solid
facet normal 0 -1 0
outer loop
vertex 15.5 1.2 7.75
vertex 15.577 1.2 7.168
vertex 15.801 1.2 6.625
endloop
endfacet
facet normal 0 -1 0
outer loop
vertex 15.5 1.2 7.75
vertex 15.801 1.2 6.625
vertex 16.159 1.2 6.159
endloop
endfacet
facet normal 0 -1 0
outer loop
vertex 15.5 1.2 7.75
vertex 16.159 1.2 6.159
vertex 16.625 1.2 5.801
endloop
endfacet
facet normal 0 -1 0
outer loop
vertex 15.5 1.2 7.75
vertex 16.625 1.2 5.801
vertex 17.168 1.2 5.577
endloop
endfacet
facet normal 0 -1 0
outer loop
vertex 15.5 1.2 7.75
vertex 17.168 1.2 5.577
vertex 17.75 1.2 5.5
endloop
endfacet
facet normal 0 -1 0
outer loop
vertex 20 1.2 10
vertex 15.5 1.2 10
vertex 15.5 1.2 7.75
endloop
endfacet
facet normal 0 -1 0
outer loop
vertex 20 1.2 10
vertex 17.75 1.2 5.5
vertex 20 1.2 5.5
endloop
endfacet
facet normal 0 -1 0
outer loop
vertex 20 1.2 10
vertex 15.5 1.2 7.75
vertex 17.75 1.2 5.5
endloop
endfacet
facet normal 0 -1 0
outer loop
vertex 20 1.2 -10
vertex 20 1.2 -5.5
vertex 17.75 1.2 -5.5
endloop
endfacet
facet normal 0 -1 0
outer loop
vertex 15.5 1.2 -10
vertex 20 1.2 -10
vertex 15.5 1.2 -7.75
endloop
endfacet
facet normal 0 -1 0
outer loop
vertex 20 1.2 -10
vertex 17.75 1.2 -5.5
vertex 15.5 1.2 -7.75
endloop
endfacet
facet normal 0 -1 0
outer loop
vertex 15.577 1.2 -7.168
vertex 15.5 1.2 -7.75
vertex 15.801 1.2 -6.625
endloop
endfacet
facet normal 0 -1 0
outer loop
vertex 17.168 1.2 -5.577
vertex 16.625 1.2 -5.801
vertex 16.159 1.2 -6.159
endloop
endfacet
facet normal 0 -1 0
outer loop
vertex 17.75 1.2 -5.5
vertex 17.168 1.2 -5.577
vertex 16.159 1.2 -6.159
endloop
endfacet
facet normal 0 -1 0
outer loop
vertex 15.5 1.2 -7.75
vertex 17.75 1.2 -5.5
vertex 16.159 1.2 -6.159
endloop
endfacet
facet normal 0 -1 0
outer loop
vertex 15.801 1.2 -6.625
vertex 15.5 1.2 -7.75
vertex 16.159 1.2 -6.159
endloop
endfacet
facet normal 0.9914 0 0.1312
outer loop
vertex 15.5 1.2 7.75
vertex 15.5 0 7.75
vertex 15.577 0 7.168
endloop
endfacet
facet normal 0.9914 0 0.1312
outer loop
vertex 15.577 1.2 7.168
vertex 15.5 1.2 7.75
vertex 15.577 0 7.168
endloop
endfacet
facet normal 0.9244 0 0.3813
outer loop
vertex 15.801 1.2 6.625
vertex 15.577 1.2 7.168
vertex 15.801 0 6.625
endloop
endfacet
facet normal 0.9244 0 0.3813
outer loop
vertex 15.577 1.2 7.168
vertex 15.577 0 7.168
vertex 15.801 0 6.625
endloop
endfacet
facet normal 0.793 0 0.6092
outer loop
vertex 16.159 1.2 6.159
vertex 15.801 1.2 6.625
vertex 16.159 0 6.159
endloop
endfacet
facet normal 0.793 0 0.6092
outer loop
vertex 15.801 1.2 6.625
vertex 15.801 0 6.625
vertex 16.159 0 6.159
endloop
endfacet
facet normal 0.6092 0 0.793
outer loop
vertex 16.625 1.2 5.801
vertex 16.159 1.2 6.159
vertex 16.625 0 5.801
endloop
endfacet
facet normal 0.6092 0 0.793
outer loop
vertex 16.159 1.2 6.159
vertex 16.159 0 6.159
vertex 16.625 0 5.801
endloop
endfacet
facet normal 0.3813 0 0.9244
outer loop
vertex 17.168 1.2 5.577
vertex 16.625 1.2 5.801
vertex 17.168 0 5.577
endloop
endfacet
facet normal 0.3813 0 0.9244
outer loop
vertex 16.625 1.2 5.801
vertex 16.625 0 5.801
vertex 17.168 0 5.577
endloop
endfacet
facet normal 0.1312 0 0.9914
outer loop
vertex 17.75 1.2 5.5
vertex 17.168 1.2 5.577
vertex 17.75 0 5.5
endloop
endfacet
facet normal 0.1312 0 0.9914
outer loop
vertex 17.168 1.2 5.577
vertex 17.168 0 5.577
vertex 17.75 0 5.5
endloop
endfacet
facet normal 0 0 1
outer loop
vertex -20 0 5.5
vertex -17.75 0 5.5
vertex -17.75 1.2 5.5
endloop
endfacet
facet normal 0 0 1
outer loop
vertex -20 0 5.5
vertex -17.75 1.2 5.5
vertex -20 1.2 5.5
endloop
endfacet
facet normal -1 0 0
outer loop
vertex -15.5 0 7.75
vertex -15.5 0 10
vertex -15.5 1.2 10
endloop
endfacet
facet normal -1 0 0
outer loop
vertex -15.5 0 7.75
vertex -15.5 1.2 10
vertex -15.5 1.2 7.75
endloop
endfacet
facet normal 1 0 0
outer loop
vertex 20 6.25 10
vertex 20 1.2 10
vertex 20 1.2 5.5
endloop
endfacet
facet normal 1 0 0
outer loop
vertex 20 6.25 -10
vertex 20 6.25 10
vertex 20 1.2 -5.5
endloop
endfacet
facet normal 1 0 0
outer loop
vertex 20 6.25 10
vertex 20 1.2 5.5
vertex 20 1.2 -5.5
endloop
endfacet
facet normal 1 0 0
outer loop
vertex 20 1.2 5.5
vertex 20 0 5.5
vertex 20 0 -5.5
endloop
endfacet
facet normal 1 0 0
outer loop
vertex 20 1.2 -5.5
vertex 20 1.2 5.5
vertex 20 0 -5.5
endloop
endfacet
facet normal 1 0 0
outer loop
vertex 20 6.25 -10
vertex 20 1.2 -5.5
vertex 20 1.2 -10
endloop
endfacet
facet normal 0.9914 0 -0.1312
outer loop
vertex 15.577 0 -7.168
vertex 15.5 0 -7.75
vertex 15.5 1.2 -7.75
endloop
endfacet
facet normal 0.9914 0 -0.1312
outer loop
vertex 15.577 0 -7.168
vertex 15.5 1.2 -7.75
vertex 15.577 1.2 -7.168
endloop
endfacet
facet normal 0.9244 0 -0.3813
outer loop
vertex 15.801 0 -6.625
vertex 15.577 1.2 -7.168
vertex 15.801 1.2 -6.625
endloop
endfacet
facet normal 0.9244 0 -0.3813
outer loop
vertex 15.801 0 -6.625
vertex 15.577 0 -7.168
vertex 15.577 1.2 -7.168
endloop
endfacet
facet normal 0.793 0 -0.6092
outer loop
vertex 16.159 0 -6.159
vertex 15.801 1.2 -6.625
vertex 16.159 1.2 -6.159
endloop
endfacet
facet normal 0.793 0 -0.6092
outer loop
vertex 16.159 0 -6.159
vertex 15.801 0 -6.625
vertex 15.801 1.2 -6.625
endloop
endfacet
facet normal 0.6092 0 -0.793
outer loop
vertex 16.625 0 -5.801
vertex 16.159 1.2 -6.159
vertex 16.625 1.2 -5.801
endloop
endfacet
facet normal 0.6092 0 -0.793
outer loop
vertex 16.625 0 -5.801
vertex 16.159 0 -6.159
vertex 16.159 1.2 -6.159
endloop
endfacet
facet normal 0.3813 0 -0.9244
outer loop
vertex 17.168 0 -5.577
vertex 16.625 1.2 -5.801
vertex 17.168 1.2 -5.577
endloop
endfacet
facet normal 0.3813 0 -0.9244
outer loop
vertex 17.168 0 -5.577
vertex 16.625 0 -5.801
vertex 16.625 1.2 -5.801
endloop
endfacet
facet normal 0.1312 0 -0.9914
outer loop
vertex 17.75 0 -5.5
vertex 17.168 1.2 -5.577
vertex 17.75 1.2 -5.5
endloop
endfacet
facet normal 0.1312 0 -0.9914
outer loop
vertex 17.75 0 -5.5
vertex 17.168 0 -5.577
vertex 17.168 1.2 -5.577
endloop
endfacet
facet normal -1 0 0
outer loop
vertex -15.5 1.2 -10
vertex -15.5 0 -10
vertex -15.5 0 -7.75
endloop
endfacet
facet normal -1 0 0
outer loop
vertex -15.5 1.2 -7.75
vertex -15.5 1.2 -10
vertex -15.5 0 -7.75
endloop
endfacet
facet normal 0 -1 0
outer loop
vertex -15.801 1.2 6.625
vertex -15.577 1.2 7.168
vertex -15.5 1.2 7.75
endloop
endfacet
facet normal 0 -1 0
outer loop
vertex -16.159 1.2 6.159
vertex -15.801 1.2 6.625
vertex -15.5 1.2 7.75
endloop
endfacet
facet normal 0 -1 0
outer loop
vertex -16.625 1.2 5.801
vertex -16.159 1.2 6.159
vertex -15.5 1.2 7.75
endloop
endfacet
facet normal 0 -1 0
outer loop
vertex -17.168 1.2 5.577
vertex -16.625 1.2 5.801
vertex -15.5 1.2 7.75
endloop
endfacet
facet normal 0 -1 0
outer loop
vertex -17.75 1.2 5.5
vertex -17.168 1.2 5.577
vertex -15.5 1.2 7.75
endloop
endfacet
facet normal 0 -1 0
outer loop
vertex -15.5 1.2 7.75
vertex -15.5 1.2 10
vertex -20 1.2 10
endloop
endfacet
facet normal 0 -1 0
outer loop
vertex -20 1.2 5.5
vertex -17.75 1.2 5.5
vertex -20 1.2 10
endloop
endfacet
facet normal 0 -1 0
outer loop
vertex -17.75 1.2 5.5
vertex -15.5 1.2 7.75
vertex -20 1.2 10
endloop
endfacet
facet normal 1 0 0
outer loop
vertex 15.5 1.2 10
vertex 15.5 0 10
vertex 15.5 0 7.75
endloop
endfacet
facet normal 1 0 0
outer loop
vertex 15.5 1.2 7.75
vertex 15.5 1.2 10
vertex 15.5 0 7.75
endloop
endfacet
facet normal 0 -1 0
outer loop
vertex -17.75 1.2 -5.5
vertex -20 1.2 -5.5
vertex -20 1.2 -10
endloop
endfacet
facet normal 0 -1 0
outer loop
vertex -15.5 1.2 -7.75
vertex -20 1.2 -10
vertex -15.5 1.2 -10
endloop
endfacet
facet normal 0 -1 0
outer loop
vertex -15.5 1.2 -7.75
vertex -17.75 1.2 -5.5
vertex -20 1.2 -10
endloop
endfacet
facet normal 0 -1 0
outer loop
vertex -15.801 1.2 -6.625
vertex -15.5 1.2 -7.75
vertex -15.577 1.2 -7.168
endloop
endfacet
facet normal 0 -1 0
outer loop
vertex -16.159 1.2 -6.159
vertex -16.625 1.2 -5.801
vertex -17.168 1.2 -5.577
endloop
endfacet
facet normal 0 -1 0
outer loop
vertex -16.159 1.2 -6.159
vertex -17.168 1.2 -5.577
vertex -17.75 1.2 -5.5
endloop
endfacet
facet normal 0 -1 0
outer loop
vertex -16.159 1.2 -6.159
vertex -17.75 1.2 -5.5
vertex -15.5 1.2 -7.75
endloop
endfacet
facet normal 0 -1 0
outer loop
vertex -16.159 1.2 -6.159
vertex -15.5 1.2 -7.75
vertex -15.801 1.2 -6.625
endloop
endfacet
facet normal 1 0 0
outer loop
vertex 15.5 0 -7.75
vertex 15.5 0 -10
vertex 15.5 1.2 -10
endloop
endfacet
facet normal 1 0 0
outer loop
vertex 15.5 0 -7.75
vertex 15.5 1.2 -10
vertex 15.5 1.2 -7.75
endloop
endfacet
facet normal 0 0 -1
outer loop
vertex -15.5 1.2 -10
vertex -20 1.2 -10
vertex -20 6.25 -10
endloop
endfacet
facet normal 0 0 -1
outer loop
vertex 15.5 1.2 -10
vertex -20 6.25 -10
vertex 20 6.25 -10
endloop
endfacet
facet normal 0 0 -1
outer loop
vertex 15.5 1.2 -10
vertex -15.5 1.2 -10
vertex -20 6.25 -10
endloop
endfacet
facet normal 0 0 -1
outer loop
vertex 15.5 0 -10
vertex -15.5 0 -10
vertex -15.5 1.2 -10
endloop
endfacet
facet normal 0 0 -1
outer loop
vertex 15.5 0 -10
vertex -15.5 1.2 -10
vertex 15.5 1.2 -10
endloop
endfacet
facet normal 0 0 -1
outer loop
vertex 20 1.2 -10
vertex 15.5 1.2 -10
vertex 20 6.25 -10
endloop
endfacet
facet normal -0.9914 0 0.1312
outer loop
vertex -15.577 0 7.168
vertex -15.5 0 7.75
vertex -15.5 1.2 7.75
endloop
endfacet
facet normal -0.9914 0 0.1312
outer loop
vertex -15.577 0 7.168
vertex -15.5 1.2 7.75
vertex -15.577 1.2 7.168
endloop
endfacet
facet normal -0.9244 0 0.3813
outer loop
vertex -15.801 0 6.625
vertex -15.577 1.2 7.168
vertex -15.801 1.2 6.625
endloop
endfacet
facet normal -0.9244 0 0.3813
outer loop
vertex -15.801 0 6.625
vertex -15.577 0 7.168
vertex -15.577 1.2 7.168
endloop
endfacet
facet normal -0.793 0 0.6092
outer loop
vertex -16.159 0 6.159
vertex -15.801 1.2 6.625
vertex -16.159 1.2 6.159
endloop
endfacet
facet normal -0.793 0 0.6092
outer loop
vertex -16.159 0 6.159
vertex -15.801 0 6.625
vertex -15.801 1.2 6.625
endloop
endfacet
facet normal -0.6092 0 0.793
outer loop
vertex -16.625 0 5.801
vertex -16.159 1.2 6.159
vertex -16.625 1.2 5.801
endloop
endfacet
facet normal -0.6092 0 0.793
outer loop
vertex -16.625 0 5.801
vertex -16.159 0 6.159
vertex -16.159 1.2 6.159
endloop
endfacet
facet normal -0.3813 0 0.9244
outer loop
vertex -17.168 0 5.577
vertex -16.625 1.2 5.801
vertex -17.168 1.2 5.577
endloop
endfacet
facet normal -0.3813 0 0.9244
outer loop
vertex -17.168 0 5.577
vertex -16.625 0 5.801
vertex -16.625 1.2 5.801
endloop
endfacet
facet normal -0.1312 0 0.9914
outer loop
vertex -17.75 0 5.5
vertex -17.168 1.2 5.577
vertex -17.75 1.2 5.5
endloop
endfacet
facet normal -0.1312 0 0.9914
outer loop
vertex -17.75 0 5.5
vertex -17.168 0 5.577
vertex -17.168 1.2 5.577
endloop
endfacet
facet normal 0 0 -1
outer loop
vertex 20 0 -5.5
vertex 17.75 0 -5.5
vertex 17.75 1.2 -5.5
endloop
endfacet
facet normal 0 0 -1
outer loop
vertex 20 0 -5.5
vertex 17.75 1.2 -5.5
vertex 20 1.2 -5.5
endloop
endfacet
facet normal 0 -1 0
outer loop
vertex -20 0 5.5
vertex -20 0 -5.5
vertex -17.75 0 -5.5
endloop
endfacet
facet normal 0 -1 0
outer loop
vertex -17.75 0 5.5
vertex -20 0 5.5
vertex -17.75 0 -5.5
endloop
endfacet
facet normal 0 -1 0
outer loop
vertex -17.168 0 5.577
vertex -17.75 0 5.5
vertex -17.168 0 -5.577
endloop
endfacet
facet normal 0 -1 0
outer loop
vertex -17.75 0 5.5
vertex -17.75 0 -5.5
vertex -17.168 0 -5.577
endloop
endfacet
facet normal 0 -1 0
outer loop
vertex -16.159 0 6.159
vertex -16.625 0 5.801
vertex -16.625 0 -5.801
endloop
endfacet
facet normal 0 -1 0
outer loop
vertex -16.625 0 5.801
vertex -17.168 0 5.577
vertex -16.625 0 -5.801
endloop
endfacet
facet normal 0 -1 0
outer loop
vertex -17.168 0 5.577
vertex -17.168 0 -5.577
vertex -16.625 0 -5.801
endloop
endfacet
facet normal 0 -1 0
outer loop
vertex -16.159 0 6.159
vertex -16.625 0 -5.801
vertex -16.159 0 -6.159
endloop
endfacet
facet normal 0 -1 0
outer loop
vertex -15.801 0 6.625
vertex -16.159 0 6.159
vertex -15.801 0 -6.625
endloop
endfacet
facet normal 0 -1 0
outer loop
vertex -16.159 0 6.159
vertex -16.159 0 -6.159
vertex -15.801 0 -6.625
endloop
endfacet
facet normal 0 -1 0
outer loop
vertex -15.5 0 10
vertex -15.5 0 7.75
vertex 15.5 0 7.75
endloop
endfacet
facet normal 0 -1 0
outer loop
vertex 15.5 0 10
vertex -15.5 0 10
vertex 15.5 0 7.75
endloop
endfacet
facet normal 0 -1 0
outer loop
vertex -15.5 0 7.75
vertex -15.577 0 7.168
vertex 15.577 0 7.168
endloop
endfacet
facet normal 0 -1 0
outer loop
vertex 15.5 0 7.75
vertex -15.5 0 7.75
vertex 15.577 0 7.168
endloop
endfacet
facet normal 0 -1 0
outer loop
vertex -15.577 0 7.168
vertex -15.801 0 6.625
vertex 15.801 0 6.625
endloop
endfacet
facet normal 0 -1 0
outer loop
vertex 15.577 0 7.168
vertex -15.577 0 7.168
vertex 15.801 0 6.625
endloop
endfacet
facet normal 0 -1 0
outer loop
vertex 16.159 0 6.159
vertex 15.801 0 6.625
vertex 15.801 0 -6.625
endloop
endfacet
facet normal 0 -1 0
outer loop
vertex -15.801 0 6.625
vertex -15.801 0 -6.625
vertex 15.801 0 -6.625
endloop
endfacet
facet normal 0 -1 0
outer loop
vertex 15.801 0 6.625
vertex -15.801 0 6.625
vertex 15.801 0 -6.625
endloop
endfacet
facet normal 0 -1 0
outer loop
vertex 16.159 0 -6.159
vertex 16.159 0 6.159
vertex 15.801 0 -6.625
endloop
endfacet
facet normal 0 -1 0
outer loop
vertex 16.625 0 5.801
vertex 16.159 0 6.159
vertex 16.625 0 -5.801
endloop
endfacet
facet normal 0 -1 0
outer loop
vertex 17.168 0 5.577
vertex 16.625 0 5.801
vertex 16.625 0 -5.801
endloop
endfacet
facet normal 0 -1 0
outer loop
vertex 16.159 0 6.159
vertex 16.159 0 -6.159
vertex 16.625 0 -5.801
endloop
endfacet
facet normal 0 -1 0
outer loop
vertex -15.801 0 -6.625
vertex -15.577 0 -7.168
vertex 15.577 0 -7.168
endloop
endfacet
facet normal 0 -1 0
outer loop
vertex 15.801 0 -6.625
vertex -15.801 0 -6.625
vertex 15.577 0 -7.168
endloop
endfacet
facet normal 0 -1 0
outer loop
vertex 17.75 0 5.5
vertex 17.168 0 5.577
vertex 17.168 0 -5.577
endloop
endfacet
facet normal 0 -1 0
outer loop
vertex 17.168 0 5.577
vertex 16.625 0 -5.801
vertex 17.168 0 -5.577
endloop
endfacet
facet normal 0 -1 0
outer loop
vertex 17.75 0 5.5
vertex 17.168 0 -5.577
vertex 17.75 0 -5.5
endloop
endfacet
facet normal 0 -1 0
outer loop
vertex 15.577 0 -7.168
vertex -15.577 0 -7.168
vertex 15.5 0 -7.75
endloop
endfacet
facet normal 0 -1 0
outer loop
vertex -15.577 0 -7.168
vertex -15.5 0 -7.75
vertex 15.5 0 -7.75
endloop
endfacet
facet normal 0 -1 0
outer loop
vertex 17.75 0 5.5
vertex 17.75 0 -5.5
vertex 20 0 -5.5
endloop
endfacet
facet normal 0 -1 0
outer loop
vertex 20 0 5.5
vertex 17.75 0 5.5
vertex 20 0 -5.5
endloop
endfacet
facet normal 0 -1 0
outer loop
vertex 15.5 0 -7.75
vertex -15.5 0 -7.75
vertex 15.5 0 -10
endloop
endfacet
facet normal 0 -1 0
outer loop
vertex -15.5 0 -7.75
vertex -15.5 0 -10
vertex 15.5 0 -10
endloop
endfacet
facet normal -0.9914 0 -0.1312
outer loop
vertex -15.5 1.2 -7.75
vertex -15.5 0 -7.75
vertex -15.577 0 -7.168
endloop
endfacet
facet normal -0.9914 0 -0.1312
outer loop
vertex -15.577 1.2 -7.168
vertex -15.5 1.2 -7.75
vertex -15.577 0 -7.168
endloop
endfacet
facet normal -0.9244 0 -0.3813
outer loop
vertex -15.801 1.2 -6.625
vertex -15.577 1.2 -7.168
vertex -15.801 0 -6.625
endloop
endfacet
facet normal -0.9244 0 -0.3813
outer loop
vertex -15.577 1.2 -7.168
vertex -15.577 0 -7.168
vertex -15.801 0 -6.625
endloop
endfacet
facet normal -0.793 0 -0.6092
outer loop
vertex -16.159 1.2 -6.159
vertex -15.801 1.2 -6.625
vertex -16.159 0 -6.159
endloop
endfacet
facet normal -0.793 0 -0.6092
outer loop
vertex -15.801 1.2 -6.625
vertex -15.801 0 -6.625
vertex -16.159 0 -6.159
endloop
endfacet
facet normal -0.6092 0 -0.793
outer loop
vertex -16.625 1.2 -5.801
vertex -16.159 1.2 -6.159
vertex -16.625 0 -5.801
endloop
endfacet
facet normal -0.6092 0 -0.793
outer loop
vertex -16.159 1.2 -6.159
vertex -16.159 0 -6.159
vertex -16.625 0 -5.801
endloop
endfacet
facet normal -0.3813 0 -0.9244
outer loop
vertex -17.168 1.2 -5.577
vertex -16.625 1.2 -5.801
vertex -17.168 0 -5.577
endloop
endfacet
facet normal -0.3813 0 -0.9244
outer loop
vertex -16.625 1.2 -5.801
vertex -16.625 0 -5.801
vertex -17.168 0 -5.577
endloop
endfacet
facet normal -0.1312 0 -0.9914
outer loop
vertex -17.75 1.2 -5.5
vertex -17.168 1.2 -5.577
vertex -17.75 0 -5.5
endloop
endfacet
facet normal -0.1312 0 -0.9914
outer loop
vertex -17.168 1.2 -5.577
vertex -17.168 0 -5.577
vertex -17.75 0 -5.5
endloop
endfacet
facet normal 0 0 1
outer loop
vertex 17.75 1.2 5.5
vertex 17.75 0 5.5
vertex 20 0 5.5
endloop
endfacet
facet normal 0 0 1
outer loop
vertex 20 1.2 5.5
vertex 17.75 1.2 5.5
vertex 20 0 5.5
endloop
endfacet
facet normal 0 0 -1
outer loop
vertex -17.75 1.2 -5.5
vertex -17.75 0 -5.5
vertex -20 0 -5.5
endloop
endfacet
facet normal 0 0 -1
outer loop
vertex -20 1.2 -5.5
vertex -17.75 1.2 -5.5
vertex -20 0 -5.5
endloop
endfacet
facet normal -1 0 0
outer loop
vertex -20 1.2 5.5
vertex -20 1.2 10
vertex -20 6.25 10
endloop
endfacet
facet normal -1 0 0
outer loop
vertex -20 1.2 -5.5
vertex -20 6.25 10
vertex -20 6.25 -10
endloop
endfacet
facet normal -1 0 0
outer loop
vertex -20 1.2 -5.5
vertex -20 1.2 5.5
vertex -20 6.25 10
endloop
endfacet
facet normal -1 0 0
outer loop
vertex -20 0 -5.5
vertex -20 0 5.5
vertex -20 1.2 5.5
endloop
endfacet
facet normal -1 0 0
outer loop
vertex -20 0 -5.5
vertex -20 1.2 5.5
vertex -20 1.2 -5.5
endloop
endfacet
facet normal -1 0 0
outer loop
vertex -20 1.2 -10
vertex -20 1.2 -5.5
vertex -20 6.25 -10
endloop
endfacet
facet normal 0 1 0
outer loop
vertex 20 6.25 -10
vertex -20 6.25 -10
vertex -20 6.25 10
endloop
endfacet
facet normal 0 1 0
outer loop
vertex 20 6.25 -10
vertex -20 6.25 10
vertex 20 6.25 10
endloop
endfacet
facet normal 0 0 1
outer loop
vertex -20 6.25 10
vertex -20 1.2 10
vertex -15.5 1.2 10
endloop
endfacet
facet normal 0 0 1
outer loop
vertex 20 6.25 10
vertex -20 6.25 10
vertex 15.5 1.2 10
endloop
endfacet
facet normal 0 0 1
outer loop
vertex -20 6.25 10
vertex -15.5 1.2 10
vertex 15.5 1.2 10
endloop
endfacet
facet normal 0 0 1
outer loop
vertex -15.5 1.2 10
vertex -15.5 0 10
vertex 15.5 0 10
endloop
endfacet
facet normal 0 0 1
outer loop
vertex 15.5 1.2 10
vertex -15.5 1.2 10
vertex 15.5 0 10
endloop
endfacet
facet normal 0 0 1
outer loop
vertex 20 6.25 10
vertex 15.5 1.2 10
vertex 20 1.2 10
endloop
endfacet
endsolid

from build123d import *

# Parameters (mm, degrees)
CROQUIS_BASE_W          = 40
CROQUIS_BASE_H          = 20
SALIENTE_EXTRUIR1_DEPTH = 6.25
CORTAR_EXTRUIR1_DEPTH   = 1.2


with BuildPart() as part:
    # Croquis base → Saliente-Extruir1 (new body)
    with BuildSketch(Plane(origin=(0, 0, 0), x_dir=(1, 0, 0), z_dir=(0, 1, 0))):
        Rectangle(CROQUIS_BASE_W, CROQUIS_BASE_H)
    extrude(amount=SALIENTE_EXTRUIR1_DEPTH)

    # Croquis base detalles → Cortar-Extruir1 (cut)
    with BuildSketch(Plane.XZ):
        with BuildLine():
            Line((15.5, 10), (15.5, 7.75))
            ThreePointArc((15.5, 7.75), (16.159009742, 6.159009742), (17.75, 5.5))
            Line((17.75, 5.5), (20, 5.5))
            Line((20, 5.5), (20, 10))
            Line((20, 10), (15.5, 10))
        make_face()
        with BuildLine():
            Line((-20, 10), (-15.5, 10))
            Line((-15.5, 10), (-15.5, 7.75))
            ThreePointArc((-15.5, 7.75), (-16.159009742, 6.159009742), (-17.75, 5.5))
            Line((-17.75, 5.5), (-20, 5.5))
            Line((-20, 5.5), (-20, 10))
        make_face()
        with BuildLine():
            Line((20, -10), (15.5, -10))
            Line((15.5, -10), (15.5, -7.75))
            ThreePointArc((15.5, -7.75), (16.159009742, -6.159009742), (17.75, -5.5))
            Line((17.75, -5.5), (20, -5.5))
            Line((20, -5.5), (20, -10))
        make_face()
        with BuildLine():
            Line((-15.5, -10), (-15.5, -7.75))
            ThreePointArc((-15.5, -7.75), (-16.159009742, -6.159009742), (-17.75, -5.5))
            Line((-17.75, -5.5), (-20, -5.5))
            Line((-20, -5.5), (-20, -10))
            Line((-20, -10), (-15.5, -10))
        make_face()
    extrude(amount=-CORTAR_EXTRUIR1_DEPTH, mode=Mode.SUBTRACT)


solid = part.part
